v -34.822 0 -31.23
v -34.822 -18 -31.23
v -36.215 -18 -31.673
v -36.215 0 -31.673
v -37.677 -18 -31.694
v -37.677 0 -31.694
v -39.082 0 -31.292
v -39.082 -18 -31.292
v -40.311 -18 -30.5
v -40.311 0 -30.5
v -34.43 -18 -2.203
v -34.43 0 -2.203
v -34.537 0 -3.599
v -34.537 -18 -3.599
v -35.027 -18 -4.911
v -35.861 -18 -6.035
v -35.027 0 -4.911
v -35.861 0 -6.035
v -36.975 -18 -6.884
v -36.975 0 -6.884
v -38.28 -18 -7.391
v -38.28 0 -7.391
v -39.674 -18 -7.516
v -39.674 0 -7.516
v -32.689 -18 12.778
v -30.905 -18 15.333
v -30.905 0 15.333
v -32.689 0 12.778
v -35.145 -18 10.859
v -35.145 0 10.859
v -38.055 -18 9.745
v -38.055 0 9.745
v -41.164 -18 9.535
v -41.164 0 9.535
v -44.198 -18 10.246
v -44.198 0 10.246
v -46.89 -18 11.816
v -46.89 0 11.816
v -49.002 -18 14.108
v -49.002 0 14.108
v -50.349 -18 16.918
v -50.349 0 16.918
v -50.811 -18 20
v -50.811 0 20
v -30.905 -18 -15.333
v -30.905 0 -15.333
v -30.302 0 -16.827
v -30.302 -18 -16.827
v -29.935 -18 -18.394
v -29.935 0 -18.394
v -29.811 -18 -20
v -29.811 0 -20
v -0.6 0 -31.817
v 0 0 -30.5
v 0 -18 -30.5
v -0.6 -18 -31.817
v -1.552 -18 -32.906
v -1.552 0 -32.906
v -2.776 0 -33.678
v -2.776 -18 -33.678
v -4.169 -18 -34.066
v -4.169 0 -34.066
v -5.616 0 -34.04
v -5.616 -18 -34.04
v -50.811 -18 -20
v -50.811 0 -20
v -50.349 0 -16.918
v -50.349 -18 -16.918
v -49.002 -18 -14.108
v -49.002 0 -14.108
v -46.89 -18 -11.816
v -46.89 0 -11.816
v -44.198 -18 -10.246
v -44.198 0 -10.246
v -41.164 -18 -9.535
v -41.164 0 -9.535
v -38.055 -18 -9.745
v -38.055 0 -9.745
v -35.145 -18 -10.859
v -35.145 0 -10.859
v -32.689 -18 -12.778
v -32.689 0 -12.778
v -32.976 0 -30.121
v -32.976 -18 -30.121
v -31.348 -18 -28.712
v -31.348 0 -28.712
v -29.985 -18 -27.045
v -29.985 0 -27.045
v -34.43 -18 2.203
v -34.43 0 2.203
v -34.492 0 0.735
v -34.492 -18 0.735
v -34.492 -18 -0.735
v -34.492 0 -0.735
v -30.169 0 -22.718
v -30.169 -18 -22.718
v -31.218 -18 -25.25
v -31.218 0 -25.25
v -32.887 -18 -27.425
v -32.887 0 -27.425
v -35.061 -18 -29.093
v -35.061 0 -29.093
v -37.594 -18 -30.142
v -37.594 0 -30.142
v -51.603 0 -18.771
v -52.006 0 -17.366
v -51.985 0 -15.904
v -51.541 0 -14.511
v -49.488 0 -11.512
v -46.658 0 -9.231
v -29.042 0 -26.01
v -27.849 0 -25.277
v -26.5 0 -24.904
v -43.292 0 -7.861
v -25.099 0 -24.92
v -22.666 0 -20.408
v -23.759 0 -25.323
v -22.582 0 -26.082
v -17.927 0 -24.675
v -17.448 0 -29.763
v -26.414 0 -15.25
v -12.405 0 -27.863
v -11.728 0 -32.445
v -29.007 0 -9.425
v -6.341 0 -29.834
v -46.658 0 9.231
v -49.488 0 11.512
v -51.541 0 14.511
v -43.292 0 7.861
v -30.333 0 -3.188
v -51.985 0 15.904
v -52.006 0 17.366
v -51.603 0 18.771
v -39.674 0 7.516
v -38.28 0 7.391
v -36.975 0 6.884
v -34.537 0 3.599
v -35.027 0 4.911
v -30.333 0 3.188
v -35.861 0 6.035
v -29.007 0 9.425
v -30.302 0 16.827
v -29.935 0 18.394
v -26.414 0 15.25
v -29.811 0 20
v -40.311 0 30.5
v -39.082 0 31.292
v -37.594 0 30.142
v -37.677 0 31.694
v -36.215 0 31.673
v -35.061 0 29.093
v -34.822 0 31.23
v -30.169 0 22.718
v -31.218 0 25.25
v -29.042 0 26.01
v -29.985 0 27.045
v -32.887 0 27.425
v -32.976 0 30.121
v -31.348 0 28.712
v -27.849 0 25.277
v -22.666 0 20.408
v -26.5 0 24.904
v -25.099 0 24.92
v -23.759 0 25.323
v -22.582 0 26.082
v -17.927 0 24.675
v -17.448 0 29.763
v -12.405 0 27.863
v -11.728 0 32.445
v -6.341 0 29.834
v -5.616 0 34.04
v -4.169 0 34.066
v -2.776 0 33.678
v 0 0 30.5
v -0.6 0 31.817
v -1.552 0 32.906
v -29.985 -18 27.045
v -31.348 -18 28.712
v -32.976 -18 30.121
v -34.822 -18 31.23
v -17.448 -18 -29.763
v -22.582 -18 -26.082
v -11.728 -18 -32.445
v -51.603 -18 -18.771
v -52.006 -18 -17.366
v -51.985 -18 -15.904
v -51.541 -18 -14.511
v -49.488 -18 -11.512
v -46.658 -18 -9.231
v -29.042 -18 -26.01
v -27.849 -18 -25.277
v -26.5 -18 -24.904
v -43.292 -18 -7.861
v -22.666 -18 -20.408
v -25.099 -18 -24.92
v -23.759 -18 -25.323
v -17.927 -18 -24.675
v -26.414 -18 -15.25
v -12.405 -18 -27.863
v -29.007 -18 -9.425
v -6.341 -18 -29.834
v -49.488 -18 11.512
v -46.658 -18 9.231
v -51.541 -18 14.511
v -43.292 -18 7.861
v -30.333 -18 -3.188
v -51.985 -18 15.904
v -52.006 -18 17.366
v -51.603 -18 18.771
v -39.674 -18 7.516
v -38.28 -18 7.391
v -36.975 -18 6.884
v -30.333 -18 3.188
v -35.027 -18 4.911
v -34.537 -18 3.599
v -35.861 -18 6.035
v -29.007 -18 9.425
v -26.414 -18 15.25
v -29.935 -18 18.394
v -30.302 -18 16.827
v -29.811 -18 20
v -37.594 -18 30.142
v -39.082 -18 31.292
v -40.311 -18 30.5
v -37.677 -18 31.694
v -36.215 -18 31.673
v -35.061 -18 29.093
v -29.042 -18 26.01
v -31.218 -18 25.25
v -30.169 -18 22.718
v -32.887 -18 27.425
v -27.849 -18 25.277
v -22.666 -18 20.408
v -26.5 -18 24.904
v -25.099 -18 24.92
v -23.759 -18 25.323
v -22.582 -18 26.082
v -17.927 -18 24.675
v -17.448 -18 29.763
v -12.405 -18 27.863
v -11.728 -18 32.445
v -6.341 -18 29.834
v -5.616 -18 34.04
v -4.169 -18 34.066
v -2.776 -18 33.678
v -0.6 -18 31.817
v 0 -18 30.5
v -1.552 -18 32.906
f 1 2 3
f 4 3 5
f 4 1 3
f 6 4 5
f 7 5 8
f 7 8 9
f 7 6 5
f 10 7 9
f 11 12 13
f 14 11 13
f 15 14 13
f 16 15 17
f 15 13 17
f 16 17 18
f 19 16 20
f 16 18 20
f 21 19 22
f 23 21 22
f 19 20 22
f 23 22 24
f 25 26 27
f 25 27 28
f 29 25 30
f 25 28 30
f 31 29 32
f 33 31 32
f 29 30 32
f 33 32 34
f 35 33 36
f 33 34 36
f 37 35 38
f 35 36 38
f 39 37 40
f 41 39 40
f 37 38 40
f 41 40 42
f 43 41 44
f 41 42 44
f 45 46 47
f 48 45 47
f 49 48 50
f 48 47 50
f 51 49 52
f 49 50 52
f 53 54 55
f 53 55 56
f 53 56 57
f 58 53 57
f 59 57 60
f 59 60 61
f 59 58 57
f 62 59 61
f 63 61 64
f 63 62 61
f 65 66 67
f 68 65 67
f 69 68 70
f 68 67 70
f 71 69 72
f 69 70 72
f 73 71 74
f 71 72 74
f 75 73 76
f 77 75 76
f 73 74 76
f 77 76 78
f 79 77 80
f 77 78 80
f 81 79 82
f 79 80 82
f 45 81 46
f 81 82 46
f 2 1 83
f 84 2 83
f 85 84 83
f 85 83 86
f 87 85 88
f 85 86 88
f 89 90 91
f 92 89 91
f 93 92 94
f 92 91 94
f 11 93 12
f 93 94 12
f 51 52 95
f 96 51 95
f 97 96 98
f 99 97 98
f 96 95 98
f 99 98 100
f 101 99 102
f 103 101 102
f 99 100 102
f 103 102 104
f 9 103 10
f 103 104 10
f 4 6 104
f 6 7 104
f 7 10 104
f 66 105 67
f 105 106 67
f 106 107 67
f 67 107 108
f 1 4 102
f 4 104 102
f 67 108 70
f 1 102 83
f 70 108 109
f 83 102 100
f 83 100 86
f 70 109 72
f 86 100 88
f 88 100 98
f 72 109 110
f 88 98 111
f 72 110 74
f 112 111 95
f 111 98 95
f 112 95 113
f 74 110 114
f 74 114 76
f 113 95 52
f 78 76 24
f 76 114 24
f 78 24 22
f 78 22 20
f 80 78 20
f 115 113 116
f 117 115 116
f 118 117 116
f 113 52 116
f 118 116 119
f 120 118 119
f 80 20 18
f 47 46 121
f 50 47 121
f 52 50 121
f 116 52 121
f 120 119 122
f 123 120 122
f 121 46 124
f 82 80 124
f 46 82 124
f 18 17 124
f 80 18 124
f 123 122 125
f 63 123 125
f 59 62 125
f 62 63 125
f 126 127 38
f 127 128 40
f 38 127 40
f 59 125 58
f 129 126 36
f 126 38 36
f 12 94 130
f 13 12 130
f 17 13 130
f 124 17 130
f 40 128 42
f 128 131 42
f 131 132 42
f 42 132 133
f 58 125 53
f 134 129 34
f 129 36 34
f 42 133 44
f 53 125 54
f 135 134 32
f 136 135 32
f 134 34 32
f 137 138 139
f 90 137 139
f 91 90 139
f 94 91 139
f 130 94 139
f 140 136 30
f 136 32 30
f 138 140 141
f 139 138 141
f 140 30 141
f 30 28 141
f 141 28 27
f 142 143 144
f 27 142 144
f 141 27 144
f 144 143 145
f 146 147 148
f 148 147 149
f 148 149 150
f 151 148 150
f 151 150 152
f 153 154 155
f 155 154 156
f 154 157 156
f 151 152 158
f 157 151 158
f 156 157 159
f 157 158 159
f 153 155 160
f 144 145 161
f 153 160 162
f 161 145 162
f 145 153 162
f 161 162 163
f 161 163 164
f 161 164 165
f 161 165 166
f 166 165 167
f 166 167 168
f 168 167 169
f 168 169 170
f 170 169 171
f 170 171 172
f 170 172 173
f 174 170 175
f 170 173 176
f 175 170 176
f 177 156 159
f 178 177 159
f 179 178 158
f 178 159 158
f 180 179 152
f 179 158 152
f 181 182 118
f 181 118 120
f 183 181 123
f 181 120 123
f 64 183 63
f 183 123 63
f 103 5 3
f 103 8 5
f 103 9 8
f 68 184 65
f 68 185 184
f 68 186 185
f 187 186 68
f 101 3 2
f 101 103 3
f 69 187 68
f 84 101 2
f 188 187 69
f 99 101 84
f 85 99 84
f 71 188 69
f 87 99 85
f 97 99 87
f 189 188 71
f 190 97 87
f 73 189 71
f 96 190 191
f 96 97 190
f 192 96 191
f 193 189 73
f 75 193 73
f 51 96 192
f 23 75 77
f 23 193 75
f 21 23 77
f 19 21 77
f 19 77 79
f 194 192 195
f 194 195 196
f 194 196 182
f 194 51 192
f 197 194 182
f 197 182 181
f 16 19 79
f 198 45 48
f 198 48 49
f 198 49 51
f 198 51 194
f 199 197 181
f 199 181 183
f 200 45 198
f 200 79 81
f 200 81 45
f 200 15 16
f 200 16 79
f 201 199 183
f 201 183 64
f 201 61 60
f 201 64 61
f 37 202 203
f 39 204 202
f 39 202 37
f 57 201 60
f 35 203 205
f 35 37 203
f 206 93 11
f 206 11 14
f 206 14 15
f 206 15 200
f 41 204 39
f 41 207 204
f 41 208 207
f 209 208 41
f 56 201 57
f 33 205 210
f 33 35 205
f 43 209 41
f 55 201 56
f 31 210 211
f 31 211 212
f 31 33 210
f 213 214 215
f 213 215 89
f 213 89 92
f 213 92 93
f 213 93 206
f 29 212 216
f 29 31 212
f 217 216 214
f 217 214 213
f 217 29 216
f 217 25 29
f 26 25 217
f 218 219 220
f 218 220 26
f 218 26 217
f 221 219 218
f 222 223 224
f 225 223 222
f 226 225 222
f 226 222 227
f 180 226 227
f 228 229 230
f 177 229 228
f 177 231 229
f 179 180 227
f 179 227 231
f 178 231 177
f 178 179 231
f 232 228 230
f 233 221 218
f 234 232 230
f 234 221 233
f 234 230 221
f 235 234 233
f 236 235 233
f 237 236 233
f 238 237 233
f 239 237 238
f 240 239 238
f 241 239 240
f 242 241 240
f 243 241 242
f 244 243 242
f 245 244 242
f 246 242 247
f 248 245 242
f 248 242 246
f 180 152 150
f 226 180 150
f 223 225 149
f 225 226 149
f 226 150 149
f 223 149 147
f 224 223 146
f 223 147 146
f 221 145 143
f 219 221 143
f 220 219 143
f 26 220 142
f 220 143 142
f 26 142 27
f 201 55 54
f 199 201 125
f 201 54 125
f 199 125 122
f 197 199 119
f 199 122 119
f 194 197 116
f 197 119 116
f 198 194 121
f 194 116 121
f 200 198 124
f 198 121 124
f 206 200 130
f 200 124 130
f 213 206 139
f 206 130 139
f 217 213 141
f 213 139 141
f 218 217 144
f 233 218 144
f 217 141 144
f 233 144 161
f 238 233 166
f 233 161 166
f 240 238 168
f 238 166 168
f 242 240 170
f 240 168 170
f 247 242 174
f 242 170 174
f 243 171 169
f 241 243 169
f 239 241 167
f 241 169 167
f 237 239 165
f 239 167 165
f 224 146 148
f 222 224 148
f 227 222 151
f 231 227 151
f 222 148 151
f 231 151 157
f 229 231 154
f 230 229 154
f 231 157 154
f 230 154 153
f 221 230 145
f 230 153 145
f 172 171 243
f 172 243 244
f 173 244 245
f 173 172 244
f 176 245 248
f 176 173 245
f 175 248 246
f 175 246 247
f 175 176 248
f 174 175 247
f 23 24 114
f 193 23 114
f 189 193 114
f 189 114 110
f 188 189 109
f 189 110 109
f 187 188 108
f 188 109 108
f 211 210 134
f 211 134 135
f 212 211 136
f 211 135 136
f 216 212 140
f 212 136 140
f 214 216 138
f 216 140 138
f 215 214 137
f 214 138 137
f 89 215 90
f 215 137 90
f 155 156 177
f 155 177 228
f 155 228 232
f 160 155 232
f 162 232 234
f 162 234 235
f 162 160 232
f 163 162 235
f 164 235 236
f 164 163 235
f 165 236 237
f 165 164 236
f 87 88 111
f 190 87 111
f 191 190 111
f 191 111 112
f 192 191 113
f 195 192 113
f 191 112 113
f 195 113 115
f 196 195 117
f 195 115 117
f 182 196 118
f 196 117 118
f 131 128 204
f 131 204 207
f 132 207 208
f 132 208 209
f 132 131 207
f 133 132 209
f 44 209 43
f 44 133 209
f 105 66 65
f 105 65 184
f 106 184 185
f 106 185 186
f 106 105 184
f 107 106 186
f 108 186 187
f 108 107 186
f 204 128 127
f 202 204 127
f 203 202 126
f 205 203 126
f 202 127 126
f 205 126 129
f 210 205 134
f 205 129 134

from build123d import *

# Parameters (mm, degrees)
F1_DEPTH     = 18
F2_T1_DEPTH  = 18
F2_T3_DEPTH  = 18
F2_T5_DEPTH  = 18
F2_T7_DEPTH  = 18
F2_T9_DEPTH  = 46.171808491
F2_T11_DEPTH = 46.171808491
F2_T13_DEPTH = 46.171808491
F2_T15_DEPTH = 46.171808491
F2_T17_DEPTH = 46.1730452367
F2_T19_DEPTH = 46.1730452367


# Not quite as in the source:
# - a fillet or chamfer that OpenCascade refuses, or shapes differently, is made with other operations: its cross-section is extruded or revolved along the edge and cut away or added


with BuildPart() as f1:
    # F0 (on Front) → F1 (new body)
    with BuildSketch(Plane.XZ):
        with BuildLine():
            ThreePointArc((-30.9053214059, 15.3333332579), (-29.4709612635, 17.9363441706), (-27.8178919283, 20.4062463149))
            ThreePointArc((-27.8178919283, 20.4062463149), (-31.6172700774, 28.9813161323), (-40.3112887415, 32.5))
            Line((-40.3112887415, 32.5), (-40.3112887415, 30.5))
            ThreePointArc((-40.3112887415, 30.5), (-32.886667539, 27.4246212025), (-29.8112887415, 20))
            ThreePointArc((-29.8112887415, 20), (-30.0884550584, 17.6034041876), (-30.9053214059, 15.3333332579))
        make_face()
        with BuildLine():
            ThreePointArc((0, -30.5), (-30.5, 0), (0, 30.5))
            Line((0, 30.5), (0, 34.5))
            ThreePointArc((0, 34.5), (-15.5922176443, 30.7755219116), (-27.8178919283, 20.4062463149))
            ThreePointArc((-27.8178919283, 20.4062463149), (-27.8129396472, 20.203149988), (-27.8112887415, 20))
            ThreePointArc((-27.8112887415, 20), (-29.205476311, 14.2631951176), (-33.0770375829, 9.8060993641))
            ThreePointArc((-33.0770375829, 9.8060993641), (-34.5, 0), (-33.0770375829, -9.8060993641))
            ThreePointArc((-33.0770375829, -9.8060993641), (-29.205476311, -14.2631951176), (-27.8112887415, -20))
            ThreePointArc((-27.8112887415, -20), (-27.8129396472, -20.203149988), (-27.8178919283, -20.4062463149))
            ThreePointArc((-27.8178919283, -20.4062463149), (-15.5922176443, -30.7755219116), (0, -34.5))
            Line((0, -34.5), (0, -30.5))
        make_face()
        with BuildLine():
            ThreePointArc((-27.8112887415, 20), (-27.8129396472, 20.203149988), (-27.8178919283, 20.4062463149))
            ThreePointArc((-27.8178919283, 20.4062463149), (-29.4709612635, 17.9363441706), (-30.9053214059, 15.3333332579))
            ThreePointArc((-30.9053214059, 15.3333332579), (-32.1103276855, 12.6165310576), (-33.0770375829, 9.8060993641))
            ThreePointArc((-33.0770375829, 9.8060993641), (-29.205476311, 14.2631951176), (-27.8112887415, 20))
        make_face()
        with BuildLine():
            ThreePointArc((-30.905321409, -15.3333332517), (-29.4709612653, -17.9363441676), (-27.8178919283, -20.4062463149))
            ThreePointArc((-27.8178919283, -20.4062463149), (-27.8129396472, -20.203149988), (-27.8112887415, -20))
            ThreePointArc((-27.8112887415, -20), (-29.205476311, -14.2631951176), (-33.0770375829, -9.8060993641))
            ThreePointArc((-33.0770375829, -9.8060993641), (-32.1103276868, -12.6165310544), (-30.905321409, -15.3333332517))
        make_face()
        with BuildLine():
            ThreePointArc((-33.0770375829, 9.8060993641), (-32.1103276855, 12.6165310576), (-30.9053214059, 15.3333332579))
            ThreePointArc((-30.9053214059, 15.3333332579), (-42.7078845539, 9.7771663169), (-50.8112887415, 20))
            Line((-50.8112887415, 20), (-52.8112887415, 20))
            ThreePointArc((-52.8112887415, 20), (-46.0480936239, 8.8941875695), (-33.0770375829, 9.8060993641))
        make_face()
        with BuildLine():
            ThreePointArc((-50.8112887415, -20), (-42.7078845573, -9.7771663177), (-30.905321409, -15.3333332517))
            ThreePointArc((-30.905321409, -15.3333332517), (-32.1103276868, -12.6165310544), (-33.0770375829, -9.8060993641))
            ThreePointArc((-33.0770375829, -9.8060993641), (-46.0480936239, -8.8941875695), (-52.8112887415, -20))
            Line((-52.8112887415, -20), (-50.8112887415, -20))
        make_face()
        with BuildLine():
            ThreePointArc((-40.3112887415, -32.5), (-31.6172700774, -28.9813161323), (-27.8178919283, -20.4062463149))
            ThreePointArc((-27.8178919283, -20.4062463149), (-29.4709612653, -17.9363441676), (-30.905321409, -15.3333332517))
            ThreePointArc((-30.905321409, -15.3333332517), (-30.0884550592, -17.6034041842), (-29.8112887415, -20))
            ThreePointArc((-29.8112887415, -20), (-32.886667539, -27.4246212025), (-40.3112887415, -30.5))
            Line((-40.3112887415, -30.5), (-40.3112887415, -32.5))
        make_face()
    extrude(amount=F1_DEPTH)

    # F2: fillet of radius 5 on 10 edges, made by hand

    # F2_s2 → F2_t1 (join)
    with BuildSketch(Plane.XZ):
        with BuildLine():
            ThreePointArc((-29.9854181156, 27.0446004725), (-26.4995189962, 24.9041460638), (-22.5822762114, 26.0823848816))
            ThreePointArc((-22.5822762114, 26.0823848816), (-25.3593942038, 23.3912617363), (-27.8178919283, 20.4062463149))
            ThreePointArc((-27.8178919283, 20.4062463149), (-28.4286678987, 23.8798610678), (-29.9854181156, 27.0446004725))
        make_face()
    extrude(amount=F2_T1_DEPTH)

    # F2_s4 → F2_t3 (join)
    with BuildSketch(Plane.XZ):
        with BuildLine():
            ThreePointArc((-39.6741951276, 7.5162460883), (-35.861056634, 6.0353637247), (-34.4295655704, 2.2034097738))
            ThreePointArc((-34.4295655704, 2.2034097738), (-33.9666835234, 6.0427154842), (-33.0770375829, 9.8060993641))
            ThreePointArc((-33.0770375829, 9.8060993641), (-36.2124627952, 8.1911208888), (-39.6741951276, 7.5162460883))
        make_face()
    extrude(amount=F2_T3_DEPTH)

    # F2_s6 → F2_t5 (join)
    with BuildSketch(Plane.XZ):
        with BuildLine():
            ThreePointArc((-34.4295655704, -2.2034097738), (-35.861056634, -6.0353637247), (-39.6741951276, -7.5162460883))
            ThreePointArc((-39.6741951276, -7.5162460883), (-36.2124627952, -8.1911208888), (-33.0770375829, -9.8060993641))
            ThreePointArc((-33.0770375829, -9.8060993641), (-33.9666835234, -6.0427154842), (-34.4295655704, -2.2034097738))
        make_face()
    extrude(amount=F2_T5_DEPTH)

    # F2_s8 → F2_t7 (join)
    with BuildSketch(Plane.XZ):
        with BuildLine():
            ThreePointArc((-29.9854181156, -27.0446004725), (-26.4995189962, -24.9041460638), (-22.5822762114, -26.0823848816))
            ThreePointArc((-22.5822762114, -26.0823848816), (-25.3593942038, -23.3912617363), (-27.8178919283, -20.4062463149))
            ThreePointArc((-27.8178919283, -20.4062463149), (-28.4286678987, -23.8798610678), (-29.9854181156, -27.0446004725))
        make_face()
    extrude(amount=F2_T7_DEPTH)

    # F2_s10 → F2_t9 (cut)
    with BuildSketch(Plane.XZ.offset(-14.0859042455)):
        with BuildLine():
            ThreePointArc((-34.8218866889, 31.2301587302), (-37.676903372, 31.6944428559), (-40.3112887415, 30.5))
            Line((-40.3112887415, 30.5), (-40.3112887415, 32.5))
            ThreePointArc((-40.3112887415, 32.5), (-37.4941078924, 32.1784026893), (-34.8218866889, 31.2301587302))
        make_face()
    extrude(amount=F2_T9_DEPTH, mode=Mode.SUBTRACT)

    # F2_s12 → F2_t11 (cut)
    with BuildSketch(Plane.XZ.offset(-14.0859042455)):
        with BuildLine():
            ThreePointArc((-51.5414474717, 14.5105979474), (-52.0057315974, 17.3656146306), (-50.8112887415, 20))
            Line((-50.8112887415, 20), (-52.8112887415, 20))
            ThreePointArc((-52.8112887415, 20), (-52.4896914308, 17.1828191509), (-51.5414474717, 14.5105979474))
        make_face()
    extrude(amount=F2_T11_DEPTH, mode=Mode.SUBTRACT)

    # F2_s14 → F2_t13 (cut)
    with BuildSketch(Plane.XZ.offset(-14.0859042455)):
        with BuildLine():
            ThreePointArc((-50.8112887415, -20), (-52.0057315974, -17.3656146306), (-51.5414474717, -14.5105979474))
            ThreePointArc((-51.5414474717, -14.5105979474), (-52.4896914308, -17.1828191509), (-52.8112887415, -20))
            Line((-52.8112887415, -20), (-50.8112887415, -20))
        make_face()
    extrude(amount=F2_T13_DEPTH, mode=Mode.SUBTRACT)

    # F2_s16 → F2_t15 (cut)
    with BuildSketch(Plane.XZ.offset(-14.0859042455)):
        with BuildLine():
            ThreePointArc((-34.8218866889, -31.2301587302), (-37.676903372, -31.6944428559), (-40.3112887415, -30.5))
            Line((-40.3112887415, -30.5), (-40.3112887415, -32.5))
            ThreePointArc((-40.3112887415, -32.5), (-37.4941078924, -32.1784026893), (-34.8218866889, -31.2301587302))
        make_face()
    extrude(amount=F2_T15_DEPTH, mode=Mode.SUBTRACT)

    # F2_s18 → F2_t17 (cut)
    with BuildSketch(Plane.XZ.offset(-14.0865226184)):
        with BuildLine():
            ThreePointArc((0, -30.5), (-2.1356819659, -33.3363611882), (-5.6157903729, -34.0398721867))
            ThreePointArc((-5.6157903729, -34.0398721867), (-2.8173045237, -34.3847756314), (0, -34.5))
            Line((0, -34.5), (0, -30.5))
        make_face()
    extrude(amount=F2_T17_DEPTH, mode=Mode.SUBTRACT)

    # F2_s20 → F2_t19 (cut)
    with BuildSketch(Plane.XZ.offset(-14.0865226184)):
        with BuildLine():
            ThreePointArc((-5.6157903729, 34.0398721867), (-2.1356819659, 33.3363611882), (0, 30.5))
            Line((0, 30.5), (0, 34.5))
            ThreePointArc((0, 34.5), (-2.8173045237, 34.3847756314), (-5.6157903729, 34.0398721867))
        make_face()
    extrude(amount=F2_T19_DEPTH, mode=Mode.SUBTRACT)


solid = f1.part
